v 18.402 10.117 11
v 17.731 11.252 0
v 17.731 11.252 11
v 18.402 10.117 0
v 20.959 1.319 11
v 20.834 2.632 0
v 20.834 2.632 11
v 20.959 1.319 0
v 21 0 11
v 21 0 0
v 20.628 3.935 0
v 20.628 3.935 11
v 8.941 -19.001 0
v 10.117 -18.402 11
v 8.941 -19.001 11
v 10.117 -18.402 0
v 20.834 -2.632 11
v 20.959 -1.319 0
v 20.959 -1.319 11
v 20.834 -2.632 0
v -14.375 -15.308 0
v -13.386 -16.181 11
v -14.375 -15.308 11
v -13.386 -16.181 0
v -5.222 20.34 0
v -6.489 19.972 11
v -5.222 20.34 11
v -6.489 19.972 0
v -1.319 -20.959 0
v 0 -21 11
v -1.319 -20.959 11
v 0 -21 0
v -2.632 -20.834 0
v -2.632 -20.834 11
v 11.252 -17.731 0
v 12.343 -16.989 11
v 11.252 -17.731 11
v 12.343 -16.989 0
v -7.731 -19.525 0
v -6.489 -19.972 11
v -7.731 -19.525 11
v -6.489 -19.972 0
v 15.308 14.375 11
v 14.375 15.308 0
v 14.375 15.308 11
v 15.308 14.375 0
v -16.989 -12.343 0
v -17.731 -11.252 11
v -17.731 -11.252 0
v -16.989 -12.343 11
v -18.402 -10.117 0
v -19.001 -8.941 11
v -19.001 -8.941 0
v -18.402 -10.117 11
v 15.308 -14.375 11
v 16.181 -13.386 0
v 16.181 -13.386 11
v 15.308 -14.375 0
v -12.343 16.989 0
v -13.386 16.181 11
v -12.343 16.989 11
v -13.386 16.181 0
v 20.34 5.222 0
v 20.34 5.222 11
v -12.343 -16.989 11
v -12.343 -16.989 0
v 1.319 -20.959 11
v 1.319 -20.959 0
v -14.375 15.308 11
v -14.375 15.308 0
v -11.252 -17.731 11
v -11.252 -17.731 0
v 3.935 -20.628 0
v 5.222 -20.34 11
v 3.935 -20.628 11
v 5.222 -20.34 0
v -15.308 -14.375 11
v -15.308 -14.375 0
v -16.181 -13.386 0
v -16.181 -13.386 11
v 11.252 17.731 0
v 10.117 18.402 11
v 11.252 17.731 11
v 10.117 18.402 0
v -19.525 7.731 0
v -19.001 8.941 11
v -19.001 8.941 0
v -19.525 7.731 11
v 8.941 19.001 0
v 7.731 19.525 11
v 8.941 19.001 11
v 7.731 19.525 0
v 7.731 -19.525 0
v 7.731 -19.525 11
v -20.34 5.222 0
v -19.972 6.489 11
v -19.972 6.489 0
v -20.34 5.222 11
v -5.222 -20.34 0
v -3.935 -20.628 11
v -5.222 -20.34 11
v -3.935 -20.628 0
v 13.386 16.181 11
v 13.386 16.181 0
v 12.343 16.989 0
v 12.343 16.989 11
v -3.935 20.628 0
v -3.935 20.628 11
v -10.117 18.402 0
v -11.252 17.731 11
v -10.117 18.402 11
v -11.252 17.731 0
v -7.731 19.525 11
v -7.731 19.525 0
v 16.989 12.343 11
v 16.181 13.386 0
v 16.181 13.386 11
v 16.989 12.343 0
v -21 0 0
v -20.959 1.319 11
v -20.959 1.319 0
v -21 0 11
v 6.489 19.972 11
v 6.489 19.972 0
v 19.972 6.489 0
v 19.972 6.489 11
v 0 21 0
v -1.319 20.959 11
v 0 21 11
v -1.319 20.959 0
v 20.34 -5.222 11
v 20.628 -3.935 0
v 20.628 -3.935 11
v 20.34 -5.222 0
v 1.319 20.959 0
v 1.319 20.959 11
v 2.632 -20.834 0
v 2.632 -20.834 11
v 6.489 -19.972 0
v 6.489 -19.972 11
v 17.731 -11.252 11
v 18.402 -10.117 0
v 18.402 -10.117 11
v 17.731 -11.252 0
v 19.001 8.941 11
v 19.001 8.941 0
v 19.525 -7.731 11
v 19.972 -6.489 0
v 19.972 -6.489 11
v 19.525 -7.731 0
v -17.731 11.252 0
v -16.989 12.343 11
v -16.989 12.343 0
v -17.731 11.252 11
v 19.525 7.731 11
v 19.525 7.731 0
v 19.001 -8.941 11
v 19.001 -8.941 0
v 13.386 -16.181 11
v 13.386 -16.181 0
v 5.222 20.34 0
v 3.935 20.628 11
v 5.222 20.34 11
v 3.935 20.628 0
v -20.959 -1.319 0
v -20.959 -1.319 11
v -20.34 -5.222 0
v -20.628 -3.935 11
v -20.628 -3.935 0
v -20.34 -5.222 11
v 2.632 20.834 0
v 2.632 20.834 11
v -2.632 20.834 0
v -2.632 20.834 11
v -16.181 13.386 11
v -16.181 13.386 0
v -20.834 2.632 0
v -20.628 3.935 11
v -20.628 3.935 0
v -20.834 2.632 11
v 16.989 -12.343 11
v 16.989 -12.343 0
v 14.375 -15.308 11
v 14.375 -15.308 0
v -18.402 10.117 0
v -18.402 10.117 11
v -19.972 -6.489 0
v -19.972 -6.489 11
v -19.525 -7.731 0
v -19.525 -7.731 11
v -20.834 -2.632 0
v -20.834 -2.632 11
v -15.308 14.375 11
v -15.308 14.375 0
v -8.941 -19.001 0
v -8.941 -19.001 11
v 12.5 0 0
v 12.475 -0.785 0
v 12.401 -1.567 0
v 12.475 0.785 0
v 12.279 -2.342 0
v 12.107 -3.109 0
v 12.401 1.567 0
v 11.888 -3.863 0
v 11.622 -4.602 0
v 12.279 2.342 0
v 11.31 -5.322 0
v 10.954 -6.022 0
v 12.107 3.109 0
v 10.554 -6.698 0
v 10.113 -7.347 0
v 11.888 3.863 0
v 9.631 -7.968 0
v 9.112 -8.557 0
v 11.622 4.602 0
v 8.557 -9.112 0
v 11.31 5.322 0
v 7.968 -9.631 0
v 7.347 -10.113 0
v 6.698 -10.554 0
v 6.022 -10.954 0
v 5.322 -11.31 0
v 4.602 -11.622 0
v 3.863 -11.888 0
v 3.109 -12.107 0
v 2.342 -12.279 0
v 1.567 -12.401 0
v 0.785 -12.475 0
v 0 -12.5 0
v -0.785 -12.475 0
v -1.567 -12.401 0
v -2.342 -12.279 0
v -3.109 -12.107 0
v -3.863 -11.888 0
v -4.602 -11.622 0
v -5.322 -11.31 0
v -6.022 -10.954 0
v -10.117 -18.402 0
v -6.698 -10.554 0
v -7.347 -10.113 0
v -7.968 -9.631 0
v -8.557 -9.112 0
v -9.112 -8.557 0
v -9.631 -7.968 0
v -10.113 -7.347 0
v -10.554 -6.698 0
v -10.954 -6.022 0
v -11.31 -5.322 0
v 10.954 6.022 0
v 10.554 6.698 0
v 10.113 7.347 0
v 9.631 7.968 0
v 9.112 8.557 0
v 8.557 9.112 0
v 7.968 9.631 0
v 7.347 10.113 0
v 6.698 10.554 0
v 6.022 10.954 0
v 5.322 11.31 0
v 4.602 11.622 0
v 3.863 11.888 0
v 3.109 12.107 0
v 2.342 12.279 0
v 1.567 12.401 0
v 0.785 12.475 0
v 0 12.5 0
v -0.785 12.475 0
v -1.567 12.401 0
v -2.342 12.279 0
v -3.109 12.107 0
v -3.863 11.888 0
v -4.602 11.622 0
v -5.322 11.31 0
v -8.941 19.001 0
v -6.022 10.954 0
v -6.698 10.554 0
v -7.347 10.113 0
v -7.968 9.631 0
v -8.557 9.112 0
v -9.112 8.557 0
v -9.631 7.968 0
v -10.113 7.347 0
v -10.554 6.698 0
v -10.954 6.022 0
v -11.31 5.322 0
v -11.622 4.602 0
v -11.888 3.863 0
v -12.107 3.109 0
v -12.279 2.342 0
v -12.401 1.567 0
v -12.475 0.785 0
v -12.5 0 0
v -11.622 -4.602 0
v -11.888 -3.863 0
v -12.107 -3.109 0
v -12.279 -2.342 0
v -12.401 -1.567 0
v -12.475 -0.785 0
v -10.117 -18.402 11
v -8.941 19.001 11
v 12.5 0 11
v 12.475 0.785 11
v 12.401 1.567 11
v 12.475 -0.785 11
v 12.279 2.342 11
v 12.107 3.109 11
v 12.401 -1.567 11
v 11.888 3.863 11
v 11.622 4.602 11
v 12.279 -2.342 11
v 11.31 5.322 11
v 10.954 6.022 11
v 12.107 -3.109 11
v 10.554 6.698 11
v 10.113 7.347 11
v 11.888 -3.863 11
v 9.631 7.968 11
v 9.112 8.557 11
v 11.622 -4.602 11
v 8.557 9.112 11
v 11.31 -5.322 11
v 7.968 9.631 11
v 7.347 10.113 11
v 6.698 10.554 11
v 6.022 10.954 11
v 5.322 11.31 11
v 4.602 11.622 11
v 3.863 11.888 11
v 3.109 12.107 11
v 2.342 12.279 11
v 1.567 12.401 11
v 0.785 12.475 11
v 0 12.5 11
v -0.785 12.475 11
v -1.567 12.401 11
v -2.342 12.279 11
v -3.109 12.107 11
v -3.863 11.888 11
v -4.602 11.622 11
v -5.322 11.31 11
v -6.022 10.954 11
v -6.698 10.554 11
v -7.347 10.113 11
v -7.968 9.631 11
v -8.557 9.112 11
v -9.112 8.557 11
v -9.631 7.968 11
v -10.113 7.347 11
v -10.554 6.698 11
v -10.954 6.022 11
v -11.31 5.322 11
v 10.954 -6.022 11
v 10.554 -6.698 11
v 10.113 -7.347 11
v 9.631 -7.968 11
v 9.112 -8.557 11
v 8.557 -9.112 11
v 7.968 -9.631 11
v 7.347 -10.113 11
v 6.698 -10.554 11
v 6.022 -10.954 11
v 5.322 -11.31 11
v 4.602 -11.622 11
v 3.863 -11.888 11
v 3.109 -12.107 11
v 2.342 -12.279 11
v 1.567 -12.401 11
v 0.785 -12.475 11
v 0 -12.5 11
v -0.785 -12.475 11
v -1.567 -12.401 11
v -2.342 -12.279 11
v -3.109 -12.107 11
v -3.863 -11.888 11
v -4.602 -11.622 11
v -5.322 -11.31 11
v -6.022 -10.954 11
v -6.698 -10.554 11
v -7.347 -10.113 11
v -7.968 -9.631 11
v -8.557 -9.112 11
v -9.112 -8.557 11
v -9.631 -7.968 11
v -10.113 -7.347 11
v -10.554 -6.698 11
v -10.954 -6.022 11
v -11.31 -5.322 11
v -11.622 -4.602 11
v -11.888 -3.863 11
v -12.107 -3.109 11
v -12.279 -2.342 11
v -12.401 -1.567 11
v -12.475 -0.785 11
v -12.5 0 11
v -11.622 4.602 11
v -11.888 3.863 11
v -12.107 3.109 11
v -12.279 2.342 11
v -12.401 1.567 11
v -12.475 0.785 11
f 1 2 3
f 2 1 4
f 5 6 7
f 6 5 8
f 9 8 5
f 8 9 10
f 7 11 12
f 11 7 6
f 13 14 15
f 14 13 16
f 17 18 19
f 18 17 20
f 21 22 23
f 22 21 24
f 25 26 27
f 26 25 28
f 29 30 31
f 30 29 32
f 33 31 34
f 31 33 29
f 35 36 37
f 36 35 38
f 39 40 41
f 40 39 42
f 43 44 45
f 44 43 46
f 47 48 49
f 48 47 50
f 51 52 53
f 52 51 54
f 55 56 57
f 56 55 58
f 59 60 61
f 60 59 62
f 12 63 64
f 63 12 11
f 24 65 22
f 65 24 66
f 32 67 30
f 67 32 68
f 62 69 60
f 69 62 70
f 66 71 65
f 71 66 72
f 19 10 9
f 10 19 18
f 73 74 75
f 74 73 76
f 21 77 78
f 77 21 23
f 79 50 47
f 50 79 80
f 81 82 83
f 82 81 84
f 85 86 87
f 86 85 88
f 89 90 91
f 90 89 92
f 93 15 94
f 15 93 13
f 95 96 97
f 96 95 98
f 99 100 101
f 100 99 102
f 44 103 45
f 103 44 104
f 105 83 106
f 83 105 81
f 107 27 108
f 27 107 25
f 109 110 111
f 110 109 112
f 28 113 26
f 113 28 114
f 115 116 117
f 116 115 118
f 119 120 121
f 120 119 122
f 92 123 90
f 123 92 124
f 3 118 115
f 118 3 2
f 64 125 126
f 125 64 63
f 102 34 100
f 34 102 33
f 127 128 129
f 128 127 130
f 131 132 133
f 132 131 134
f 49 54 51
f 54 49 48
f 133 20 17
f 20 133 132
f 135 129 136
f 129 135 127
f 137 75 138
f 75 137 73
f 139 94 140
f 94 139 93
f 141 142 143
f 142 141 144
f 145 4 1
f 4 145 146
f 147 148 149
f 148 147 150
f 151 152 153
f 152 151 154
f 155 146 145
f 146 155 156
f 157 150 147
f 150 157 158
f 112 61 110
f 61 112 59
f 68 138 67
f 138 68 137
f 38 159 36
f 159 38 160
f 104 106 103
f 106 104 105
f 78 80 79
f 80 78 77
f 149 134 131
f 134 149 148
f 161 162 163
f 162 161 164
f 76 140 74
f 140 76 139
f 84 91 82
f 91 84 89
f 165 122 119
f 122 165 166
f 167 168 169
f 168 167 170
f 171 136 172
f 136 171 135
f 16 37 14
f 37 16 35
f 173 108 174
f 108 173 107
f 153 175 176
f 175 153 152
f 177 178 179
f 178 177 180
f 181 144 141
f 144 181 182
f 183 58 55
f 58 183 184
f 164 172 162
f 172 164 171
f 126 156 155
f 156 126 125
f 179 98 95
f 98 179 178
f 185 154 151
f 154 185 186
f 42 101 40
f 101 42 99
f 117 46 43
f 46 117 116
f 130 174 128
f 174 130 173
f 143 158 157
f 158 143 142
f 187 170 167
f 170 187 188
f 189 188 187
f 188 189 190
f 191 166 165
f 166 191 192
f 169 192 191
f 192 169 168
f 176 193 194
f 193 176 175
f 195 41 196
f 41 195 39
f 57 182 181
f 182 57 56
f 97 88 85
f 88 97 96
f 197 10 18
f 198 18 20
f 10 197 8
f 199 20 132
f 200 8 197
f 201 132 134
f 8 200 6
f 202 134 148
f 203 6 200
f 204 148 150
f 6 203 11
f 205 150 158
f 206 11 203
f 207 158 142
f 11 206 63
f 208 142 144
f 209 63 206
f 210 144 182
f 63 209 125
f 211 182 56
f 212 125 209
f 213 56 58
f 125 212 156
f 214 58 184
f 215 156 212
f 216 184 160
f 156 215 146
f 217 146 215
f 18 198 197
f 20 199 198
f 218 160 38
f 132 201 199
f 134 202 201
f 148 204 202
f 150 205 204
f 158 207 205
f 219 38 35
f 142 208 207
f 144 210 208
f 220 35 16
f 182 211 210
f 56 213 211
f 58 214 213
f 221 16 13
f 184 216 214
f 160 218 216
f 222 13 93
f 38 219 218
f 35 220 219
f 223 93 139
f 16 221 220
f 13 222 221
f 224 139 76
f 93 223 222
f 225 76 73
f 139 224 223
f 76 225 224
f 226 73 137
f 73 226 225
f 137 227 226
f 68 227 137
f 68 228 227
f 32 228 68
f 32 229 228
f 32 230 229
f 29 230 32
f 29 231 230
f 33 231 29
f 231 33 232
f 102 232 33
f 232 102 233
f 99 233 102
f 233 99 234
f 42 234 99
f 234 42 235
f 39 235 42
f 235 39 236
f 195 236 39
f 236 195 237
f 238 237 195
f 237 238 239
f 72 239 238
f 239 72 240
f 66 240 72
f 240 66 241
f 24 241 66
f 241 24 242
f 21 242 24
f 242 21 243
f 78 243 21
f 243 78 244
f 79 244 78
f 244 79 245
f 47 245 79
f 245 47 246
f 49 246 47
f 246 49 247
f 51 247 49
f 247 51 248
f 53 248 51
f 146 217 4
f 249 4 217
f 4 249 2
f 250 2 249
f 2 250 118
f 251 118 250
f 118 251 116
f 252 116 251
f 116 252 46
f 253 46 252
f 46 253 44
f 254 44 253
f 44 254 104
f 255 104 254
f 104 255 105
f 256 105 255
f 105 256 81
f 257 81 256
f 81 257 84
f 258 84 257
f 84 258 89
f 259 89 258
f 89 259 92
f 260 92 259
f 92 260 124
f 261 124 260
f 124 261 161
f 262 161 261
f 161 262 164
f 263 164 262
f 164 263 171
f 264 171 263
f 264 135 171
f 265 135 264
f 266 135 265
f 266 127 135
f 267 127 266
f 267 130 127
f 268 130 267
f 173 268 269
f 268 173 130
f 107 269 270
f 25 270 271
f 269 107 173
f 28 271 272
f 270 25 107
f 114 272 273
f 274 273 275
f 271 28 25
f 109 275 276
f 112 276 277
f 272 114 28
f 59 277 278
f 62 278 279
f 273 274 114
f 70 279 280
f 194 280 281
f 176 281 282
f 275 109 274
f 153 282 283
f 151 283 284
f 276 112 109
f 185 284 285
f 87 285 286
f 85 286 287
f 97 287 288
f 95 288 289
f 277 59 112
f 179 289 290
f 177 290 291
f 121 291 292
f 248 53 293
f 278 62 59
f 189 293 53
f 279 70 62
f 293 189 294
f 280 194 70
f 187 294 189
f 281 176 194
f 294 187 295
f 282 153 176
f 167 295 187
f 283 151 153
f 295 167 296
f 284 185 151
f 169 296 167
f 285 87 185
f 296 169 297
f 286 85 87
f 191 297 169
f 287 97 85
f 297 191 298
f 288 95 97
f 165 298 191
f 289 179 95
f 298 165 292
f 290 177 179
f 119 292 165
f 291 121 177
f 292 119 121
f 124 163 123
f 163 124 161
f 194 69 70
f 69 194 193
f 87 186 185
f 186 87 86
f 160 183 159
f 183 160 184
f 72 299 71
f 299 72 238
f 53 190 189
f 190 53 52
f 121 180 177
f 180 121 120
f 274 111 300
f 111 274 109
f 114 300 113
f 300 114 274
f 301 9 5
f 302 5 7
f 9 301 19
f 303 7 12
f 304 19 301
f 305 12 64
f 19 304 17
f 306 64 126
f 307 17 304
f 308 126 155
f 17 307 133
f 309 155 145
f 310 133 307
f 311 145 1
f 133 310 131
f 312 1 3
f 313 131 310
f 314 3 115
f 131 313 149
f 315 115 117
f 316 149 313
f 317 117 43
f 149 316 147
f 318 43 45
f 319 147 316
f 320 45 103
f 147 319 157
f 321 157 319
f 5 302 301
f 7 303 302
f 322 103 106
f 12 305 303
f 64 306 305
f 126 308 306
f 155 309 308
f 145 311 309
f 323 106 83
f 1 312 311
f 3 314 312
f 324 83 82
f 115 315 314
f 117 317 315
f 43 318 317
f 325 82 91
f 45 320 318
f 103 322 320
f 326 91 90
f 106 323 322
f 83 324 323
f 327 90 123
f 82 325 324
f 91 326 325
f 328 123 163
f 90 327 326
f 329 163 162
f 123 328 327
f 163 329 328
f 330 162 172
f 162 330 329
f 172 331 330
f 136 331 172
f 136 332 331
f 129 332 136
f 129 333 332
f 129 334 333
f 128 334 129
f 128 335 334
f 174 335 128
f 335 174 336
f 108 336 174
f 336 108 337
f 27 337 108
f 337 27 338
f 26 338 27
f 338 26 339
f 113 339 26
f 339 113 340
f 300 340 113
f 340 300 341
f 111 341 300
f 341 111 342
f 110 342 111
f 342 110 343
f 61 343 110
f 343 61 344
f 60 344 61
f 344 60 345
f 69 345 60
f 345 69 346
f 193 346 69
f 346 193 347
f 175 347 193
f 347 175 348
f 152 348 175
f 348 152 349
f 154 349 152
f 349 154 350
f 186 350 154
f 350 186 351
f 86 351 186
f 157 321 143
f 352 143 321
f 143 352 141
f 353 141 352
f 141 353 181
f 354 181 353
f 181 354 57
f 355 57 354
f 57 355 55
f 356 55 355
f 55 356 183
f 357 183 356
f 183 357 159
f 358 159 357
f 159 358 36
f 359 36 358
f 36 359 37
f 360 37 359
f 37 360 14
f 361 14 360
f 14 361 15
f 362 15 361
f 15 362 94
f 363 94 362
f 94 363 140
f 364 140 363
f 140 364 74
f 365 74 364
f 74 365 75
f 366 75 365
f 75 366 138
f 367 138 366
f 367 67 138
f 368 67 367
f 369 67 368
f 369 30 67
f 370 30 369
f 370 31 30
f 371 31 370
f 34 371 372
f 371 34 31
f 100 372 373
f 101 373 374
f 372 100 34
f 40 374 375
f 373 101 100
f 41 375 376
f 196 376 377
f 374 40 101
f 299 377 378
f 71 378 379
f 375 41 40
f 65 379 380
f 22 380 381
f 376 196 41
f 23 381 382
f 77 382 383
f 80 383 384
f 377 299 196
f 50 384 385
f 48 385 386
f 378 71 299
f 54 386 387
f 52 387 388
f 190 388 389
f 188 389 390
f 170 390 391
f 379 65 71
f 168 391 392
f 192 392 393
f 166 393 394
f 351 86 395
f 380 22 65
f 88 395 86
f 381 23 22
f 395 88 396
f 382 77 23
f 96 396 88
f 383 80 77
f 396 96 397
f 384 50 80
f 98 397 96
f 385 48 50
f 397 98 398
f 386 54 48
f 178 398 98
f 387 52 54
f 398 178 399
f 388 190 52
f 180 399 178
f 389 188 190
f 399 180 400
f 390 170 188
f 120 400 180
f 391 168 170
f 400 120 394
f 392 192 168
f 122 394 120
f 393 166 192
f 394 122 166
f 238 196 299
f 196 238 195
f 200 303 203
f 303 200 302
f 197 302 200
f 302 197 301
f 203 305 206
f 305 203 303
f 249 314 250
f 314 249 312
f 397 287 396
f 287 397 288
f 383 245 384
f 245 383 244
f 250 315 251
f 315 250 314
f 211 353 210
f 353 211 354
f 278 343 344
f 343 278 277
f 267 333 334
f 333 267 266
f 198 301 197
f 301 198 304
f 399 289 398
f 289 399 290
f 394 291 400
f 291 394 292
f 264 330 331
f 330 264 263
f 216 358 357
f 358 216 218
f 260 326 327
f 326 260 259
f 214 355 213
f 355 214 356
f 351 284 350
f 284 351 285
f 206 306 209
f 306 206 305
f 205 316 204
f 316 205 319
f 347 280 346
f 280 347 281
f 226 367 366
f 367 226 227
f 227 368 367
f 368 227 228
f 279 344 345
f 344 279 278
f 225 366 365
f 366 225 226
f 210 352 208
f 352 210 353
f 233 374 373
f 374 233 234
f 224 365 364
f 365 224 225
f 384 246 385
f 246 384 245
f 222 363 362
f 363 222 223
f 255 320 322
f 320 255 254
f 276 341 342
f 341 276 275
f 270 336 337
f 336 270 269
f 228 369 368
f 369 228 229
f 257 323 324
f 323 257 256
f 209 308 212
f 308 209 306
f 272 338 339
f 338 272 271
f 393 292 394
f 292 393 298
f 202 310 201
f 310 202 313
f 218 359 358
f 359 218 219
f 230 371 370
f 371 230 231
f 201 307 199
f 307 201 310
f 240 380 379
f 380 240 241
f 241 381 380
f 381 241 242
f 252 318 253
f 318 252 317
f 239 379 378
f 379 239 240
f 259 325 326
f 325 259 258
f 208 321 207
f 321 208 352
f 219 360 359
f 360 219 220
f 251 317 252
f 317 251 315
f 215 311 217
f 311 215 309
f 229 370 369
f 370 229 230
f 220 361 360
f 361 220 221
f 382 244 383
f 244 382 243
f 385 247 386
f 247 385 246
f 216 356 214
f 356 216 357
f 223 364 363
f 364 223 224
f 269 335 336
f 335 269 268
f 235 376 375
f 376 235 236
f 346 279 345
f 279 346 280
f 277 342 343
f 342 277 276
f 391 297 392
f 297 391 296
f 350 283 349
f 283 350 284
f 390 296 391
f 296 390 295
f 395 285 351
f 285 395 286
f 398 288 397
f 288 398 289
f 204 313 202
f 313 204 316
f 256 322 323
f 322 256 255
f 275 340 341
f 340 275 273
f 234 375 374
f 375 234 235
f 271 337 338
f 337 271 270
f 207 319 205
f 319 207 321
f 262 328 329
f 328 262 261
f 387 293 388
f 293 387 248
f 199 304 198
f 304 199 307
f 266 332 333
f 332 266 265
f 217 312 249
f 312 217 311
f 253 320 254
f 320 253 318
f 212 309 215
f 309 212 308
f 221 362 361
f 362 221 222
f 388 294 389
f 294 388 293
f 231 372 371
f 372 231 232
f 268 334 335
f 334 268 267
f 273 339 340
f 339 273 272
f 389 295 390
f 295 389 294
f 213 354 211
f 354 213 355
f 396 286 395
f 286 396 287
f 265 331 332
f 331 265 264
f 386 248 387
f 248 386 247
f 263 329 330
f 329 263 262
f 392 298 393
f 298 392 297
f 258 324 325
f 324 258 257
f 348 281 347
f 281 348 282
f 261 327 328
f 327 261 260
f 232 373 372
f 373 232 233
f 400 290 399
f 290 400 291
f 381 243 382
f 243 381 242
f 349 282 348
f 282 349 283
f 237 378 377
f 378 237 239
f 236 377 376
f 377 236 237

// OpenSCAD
// file: tolerance.scad
// Author: Mihai Oltean, https://mihaioltean.github.io, mihai.oltean@gmail.com
// More details: jenny5.org
// Source: github.com/jenny5-robot
// MIT License
//--------------------------------------------------------------

tolerance = 0.1;
display_tolerance = 1;

overlap_tolerance = 0.01;

tolerance_z = [0, 0, tolerance];
tolerance_x = [tolerance, 0, 0];
tolerance_y = [0, tolerance, 0];

display_tolerance_z = [0, 0, display_tolerance];
display_tolerance_x = [display_tolerance, 0, 0];
display_tolerance_y = [0, display_tolerance, 0];

display_tolerance_xz = [display_tolerance, 0, display_tolerance];
display_tolerance_xy = [display_tolerance, display_tolerance, 0];
display_tolerance_yz = [0, display_tolerance, display_tolerance];

display_tolerance_xyz = [display_tolerance, display_tolerance, display_tolerance];
// file: config.scad
// Author: Mihai Oltean, www.tcreate.org, mihai.oltean@gmail.com
// More details: jenny5.org
// Source: github.com/jenny5-robot
// MIT License
//--------------------------------------------------------------

aluminium_color = "Silver";
screw_color = "LightSlateGray";
frame_color = aluminium_color;
shaft_color = "Silver";
plastic_color = "Yellow";
pulley_color = "DarkSlateGray";
steel_color = "LightSlateGray";
// file: params_basic_components.scad
// Author: Mihai Oltean, https://mihaioltean.github.io, mihai.oltean@gmail.com
// More details: jenny5.org
// Source: github.com/jenny5-robot
// MIT License
//--------------------------------------------------------------

spring_length = 20;

smooth_rod_8_radius = 4;
smooth_rod_10_radius = 5;
smooth_rod_12_radius = 6;

wall_thick_1 = 1;
wall_thick_2 = 2;
wall_thick_3 = 3;
wall_thick_4 = 4;
wall_thick_5 = 5;
wall_thick_5_5 = 5.5;
wall_thick_6 = 6;
wall_thick_7 = 7;
wall_thick_8 = 8;
wall_thick_9 = 9;
wall_thick_10 = 10;
wall_thick_12 = 12;
// file: params_thrust_bearings.scad
// Author: Mihai Oltean, www.tcreate.org, mihai.oltean@gmail.com
// More details: jenny5.org
// Source: github.com/jenny5-robot
// MIT License
//--------------------------------------------------------------

tb_51105_external_radius = 21;
tb_51105_internal_radius = 12.5;
tb_51105_height = 11;
// main file
// Author: Mihai Oltean, 
// https://mihaioltean.github.io, mihai.oltean@gmail.com
// More details: jenny5.org
// Source: github.com/jenny5-robot
// MIT License
//--------------------------------------------------------------

include <params_thrust_bearings.scad>
include <params_basic_components.scad>
include <config.scad>
include <tolerance.scad>

//--------------------------------------------------------------
module thrust_bearing(external_radius, internal_radius, height)
{
    difference(){
        color(steel_color)
        cylinder(h = height, r = external_radius, $fn = 100);
        translate (-display_tolerance_z) cylinder(h = height + 2 * display_tolerance, r = internal_radius, $fn = 100);
    }
}
//--------------------------------------------------------------
module thrust_bearing_51105()
{
    thrust_bearing(external_radius = tb_51105_external_radius, internal_radius = tb_51105_internal_radius, height = tb_51105_height);
}
//--------------------------------------------------------------

thrust_bearing_51105();
